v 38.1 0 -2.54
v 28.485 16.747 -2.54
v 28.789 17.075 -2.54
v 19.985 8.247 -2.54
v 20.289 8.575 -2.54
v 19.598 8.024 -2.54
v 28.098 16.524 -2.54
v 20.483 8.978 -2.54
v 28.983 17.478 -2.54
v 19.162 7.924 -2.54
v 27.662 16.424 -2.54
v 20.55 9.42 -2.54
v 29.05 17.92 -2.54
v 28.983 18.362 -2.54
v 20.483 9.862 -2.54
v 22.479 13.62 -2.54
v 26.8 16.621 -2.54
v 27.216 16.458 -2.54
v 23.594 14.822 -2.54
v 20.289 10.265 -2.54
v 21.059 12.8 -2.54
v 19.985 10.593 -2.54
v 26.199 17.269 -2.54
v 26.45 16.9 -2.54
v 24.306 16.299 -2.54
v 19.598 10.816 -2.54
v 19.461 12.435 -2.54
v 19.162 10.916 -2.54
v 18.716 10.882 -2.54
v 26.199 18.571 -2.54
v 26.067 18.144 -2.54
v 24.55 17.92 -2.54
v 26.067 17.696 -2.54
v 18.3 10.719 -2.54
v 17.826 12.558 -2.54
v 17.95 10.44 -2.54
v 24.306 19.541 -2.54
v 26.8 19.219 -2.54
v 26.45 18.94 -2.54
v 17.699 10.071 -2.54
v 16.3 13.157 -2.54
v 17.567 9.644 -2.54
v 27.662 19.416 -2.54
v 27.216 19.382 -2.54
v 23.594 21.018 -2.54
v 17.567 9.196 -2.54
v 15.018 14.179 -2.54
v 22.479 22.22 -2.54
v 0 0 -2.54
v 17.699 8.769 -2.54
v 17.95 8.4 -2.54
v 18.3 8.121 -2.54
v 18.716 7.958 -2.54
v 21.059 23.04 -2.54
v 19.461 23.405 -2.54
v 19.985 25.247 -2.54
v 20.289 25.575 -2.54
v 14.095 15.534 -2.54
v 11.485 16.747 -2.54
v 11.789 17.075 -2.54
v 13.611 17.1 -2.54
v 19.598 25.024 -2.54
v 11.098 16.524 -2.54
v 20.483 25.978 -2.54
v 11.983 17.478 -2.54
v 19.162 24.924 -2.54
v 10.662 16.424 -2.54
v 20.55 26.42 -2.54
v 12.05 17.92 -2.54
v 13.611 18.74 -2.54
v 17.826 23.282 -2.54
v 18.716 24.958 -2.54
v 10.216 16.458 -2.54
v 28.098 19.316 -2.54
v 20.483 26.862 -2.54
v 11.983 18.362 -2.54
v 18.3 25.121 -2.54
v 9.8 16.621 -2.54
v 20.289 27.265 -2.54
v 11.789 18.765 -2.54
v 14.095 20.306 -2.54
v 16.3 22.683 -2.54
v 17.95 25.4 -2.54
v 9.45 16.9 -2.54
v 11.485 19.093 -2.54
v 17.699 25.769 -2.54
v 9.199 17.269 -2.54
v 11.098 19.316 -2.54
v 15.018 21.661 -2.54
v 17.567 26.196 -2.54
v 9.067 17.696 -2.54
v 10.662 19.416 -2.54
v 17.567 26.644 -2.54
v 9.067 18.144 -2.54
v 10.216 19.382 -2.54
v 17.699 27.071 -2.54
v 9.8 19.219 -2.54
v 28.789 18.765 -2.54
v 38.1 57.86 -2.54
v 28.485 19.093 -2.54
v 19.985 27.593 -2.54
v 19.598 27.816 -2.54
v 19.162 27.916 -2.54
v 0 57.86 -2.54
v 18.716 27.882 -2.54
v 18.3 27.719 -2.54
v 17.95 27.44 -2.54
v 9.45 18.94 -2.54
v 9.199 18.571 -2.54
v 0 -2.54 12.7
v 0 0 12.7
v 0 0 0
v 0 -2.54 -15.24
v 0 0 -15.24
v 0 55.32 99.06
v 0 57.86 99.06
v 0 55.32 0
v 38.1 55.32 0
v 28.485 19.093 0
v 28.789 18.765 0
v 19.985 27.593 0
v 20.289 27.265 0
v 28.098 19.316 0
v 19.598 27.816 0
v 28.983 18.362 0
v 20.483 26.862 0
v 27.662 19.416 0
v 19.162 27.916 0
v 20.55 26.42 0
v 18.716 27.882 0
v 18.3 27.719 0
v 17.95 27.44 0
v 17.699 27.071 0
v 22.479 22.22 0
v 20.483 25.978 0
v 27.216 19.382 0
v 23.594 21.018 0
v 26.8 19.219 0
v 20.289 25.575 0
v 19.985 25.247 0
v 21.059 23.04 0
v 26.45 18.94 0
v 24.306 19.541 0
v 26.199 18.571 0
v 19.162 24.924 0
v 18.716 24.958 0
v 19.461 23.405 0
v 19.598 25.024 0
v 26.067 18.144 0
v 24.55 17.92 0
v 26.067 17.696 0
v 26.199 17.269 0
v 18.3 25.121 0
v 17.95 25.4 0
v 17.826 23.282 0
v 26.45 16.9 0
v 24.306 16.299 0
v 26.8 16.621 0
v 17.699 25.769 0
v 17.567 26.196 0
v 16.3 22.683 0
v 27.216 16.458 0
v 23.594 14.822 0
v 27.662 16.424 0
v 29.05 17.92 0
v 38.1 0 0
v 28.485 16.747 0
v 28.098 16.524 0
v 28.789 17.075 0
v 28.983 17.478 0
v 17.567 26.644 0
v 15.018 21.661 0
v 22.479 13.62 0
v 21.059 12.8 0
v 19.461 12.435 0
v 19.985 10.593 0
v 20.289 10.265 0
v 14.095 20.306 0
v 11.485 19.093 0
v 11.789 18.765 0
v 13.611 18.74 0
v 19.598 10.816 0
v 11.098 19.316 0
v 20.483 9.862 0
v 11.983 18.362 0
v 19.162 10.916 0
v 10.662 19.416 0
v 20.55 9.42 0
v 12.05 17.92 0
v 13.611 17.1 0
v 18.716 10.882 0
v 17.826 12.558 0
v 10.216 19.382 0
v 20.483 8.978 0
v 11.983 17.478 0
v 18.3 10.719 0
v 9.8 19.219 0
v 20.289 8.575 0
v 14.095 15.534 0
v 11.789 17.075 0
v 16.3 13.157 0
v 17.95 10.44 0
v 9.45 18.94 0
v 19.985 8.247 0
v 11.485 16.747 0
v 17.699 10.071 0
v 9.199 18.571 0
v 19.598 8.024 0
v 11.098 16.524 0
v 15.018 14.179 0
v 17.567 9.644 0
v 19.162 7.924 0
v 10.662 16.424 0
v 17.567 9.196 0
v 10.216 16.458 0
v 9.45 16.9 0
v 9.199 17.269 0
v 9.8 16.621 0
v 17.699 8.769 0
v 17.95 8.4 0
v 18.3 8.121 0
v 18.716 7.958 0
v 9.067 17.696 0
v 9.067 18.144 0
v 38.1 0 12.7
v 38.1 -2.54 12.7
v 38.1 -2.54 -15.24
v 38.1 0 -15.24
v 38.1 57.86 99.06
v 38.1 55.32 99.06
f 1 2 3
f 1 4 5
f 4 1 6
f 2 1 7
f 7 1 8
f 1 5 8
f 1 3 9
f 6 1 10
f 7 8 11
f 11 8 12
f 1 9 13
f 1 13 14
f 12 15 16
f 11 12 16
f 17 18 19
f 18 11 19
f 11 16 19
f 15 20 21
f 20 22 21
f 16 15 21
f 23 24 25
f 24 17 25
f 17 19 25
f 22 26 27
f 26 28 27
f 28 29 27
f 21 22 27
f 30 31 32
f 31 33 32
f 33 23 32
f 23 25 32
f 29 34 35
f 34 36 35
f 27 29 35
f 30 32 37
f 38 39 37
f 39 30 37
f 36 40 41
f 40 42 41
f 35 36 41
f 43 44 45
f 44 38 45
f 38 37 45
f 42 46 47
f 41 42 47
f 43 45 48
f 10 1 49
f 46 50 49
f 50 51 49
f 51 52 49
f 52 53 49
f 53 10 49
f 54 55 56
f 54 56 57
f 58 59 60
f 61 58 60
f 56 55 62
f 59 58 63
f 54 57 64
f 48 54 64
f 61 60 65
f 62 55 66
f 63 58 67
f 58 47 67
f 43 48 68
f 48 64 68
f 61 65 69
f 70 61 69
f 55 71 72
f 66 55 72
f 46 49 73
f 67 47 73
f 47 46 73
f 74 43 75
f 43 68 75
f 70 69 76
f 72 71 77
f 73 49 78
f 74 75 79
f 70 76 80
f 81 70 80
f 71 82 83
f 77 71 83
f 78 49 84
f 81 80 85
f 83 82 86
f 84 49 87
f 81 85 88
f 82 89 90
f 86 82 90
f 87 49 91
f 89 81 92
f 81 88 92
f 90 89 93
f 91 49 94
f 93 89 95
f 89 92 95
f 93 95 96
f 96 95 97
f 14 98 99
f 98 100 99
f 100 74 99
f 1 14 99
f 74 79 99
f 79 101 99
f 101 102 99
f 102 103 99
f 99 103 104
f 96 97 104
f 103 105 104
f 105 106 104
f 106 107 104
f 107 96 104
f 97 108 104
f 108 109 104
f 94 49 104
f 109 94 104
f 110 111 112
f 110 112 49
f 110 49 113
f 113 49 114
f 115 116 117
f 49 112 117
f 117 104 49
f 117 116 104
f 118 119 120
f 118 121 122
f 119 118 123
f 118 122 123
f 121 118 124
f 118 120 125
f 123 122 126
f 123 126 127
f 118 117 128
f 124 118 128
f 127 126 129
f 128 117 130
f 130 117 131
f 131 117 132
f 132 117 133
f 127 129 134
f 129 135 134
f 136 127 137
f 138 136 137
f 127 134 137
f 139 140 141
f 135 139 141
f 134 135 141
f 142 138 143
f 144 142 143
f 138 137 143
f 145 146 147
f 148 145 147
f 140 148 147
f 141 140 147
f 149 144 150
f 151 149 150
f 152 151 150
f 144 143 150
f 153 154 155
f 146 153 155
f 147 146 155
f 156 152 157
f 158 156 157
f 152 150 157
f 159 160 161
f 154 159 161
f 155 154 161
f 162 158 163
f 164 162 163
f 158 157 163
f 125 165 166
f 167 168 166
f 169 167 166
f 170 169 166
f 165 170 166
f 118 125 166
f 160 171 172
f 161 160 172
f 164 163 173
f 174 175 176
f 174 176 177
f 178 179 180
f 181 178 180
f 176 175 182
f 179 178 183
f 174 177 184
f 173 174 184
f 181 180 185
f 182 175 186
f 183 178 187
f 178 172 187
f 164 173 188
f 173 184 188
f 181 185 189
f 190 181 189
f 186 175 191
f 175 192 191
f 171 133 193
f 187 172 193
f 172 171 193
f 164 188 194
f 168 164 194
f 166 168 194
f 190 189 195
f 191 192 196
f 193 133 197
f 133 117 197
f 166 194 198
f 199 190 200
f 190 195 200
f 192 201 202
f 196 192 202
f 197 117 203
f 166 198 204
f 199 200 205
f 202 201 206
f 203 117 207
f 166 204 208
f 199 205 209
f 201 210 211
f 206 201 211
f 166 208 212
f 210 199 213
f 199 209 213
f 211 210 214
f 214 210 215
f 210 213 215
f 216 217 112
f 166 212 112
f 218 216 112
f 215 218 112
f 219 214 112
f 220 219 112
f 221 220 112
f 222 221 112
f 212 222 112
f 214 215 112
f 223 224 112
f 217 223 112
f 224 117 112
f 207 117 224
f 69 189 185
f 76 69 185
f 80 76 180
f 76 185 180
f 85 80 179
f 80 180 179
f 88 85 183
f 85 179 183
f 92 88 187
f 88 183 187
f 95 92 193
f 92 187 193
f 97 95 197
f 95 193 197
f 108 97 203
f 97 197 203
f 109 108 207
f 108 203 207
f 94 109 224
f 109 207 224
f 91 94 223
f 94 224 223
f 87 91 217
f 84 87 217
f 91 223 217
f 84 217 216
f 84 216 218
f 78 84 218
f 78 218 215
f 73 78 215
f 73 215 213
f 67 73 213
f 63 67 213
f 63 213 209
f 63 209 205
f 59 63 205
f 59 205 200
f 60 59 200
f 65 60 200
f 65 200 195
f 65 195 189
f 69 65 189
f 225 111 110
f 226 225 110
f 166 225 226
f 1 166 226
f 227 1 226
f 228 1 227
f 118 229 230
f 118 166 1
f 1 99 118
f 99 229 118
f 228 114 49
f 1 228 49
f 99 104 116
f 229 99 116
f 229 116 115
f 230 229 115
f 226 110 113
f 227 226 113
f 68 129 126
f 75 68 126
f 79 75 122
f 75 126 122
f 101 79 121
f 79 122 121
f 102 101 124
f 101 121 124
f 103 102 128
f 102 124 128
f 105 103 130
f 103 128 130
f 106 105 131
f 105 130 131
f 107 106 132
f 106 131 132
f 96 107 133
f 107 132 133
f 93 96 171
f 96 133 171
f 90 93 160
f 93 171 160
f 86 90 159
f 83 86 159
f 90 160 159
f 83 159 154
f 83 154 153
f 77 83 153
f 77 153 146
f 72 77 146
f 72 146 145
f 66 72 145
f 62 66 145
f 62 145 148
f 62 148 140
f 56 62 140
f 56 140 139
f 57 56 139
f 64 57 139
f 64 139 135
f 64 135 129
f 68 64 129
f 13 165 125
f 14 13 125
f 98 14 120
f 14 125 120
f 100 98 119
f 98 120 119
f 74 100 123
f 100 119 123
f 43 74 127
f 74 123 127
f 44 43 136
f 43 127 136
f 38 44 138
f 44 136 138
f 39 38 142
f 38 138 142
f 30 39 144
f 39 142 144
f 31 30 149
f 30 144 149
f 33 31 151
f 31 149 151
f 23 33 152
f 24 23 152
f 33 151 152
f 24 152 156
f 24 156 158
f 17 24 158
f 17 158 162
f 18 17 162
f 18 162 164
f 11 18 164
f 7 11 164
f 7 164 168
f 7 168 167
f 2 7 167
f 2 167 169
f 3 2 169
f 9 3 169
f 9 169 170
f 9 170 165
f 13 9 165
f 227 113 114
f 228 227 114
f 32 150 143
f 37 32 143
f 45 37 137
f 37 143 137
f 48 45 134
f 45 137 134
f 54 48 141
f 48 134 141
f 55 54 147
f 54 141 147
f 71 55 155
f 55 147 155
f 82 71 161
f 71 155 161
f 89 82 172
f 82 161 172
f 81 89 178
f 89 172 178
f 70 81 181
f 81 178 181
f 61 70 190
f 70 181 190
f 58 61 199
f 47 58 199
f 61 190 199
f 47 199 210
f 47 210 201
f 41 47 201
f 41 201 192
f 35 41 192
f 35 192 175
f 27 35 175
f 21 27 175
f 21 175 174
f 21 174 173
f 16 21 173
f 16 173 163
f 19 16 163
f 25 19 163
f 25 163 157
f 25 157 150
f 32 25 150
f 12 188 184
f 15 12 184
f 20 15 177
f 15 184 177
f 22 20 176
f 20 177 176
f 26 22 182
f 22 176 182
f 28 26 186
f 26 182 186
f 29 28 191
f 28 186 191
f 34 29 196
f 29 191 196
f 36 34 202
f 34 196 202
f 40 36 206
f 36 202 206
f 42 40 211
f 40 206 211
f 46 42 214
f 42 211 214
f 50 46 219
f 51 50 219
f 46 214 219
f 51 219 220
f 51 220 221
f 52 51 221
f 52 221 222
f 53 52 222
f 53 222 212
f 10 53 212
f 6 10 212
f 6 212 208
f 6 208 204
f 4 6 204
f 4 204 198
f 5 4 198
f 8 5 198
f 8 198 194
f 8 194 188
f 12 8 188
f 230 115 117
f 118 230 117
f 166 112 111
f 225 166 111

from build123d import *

# Parameters (mm, degrees)
BOSS_EXTRUDE1_DEPTH = 38.1
CUT_EXTRUDE2_REACH  = 122.881
SKETCH2_R           = 1.5
SKETCH2_R_2         = 5.5


with BuildPart() as part:
    # Sketch1 → Boss-Extrude1 (new body)
    with BuildSketch(Plane(origin=(0, 0, 0), x_dir=(0, 0, -1), z_dir=(1, 0, 0))):
        Polygon((-99.06, 57.86), (-99.06, 55.32), (0, 55.32), (0, 0), (-12.7, 0), (-12.7, -2.54), (15.24, -2.54), (15.24, 0), (2.54, 0), (2.54, 57.86), align=None)
    extrude(amount=BOSS_EXTRUDE1_DEPTH)

    # Sketch2 → Cut-Extrude2 (cut, up to next)
    with BuildSketch(Plane.XY, mode=Mode.PRIVATE) as cut_extrude2_sk1:
        with Locations((19.05, 26.42)):
            Circle(SKETCH2_R)
    cut_extrude2_tool1 = extrude(cut_extrude2_sk1.sketch, amount=-CUT_EXTRUDE2_REACH, mode=Mode.PRIVATE) & part.part
    # Sketch2 → Cut-Extrude2 (cut, up to next)
    with BuildSketch(Plane.XY, mode=Mode.PRIVATE) as cut_extrude2_sk2:
        with Locations((19.05, 9.42)):
            Circle(SKETCH2_R)
    cut_extrude2_tool2 = extrude(cut_extrude2_sk2.sketch, amount=-CUT_EXTRUDE2_REACH, mode=Mode.PRIVATE) & part.part
    # Sketch2 → Cut-Extrude2 (cut, up to next)
    with BuildSketch(Plane.XY, mode=Mode.PRIVATE) as cut_extrude2_sk3:
        with Locations((27.55, 17.92)):
            Circle(SKETCH2_R)
    cut_extrude2_tool3 = extrude(cut_extrude2_sk3.sketch, amount=-CUT_EXTRUDE2_REACH, mode=Mode.PRIVATE) & part.part
    # Sketch2 → Cut-Extrude2 (cut, up to next)
    with BuildSketch(Plane.XY, mode=Mode.PRIVATE) as cut_extrude2_sk4:
        with Locations((10.55, 17.92)):
            Circle(SKETCH2_R)
    cut_extrude2_tool4 = extrude(cut_extrude2_sk4.sketch, amount=-CUT_EXTRUDE2_REACH, mode=Mode.PRIVATE) & part.part
    # Sketch2 → Cut-Extrude2 (cut, up to next)
    with BuildSketch(Plane.XY, mode=Mode.PRIVATE) as cut_extrude2_sk5:
        with Locations((19.05, 17.92)):
            Circle(SKETCH2_R_2)
    cut_extrude2_tool5 = extrude(cut_extrude2_sk5.sketch, amount=-CUT_EXTRUDE2_REACH, mode=Mode.PRIVATE) & part.part
    add(cut_extrude2_tool1.solids().sort_by_distance((19.05, 26.42, 0))[0], mode=Mode.SUBTRACT)
    add(cut_extrude2_tool2.solids().sort_by_distance((19.05, 9.42, 0))[0], mode=Mode.SUBTRACT)
    add(cut_extrude2_tool3.solids().sort_by_distance((27.55, 17.92, 0))[0], mode=Mode.SUBTRACT)
    add(cut_extrude2_tool4.solids().sort_by_distance((10.55, 17.92, 0))[0], mode=Mode.SUBTRACT)
    add(cut_extrude2_tool5.solids().sort_by_distance((19.05, 17.92, 0))[0], mode=Mode.SUBTRACT)


solid = part.part
